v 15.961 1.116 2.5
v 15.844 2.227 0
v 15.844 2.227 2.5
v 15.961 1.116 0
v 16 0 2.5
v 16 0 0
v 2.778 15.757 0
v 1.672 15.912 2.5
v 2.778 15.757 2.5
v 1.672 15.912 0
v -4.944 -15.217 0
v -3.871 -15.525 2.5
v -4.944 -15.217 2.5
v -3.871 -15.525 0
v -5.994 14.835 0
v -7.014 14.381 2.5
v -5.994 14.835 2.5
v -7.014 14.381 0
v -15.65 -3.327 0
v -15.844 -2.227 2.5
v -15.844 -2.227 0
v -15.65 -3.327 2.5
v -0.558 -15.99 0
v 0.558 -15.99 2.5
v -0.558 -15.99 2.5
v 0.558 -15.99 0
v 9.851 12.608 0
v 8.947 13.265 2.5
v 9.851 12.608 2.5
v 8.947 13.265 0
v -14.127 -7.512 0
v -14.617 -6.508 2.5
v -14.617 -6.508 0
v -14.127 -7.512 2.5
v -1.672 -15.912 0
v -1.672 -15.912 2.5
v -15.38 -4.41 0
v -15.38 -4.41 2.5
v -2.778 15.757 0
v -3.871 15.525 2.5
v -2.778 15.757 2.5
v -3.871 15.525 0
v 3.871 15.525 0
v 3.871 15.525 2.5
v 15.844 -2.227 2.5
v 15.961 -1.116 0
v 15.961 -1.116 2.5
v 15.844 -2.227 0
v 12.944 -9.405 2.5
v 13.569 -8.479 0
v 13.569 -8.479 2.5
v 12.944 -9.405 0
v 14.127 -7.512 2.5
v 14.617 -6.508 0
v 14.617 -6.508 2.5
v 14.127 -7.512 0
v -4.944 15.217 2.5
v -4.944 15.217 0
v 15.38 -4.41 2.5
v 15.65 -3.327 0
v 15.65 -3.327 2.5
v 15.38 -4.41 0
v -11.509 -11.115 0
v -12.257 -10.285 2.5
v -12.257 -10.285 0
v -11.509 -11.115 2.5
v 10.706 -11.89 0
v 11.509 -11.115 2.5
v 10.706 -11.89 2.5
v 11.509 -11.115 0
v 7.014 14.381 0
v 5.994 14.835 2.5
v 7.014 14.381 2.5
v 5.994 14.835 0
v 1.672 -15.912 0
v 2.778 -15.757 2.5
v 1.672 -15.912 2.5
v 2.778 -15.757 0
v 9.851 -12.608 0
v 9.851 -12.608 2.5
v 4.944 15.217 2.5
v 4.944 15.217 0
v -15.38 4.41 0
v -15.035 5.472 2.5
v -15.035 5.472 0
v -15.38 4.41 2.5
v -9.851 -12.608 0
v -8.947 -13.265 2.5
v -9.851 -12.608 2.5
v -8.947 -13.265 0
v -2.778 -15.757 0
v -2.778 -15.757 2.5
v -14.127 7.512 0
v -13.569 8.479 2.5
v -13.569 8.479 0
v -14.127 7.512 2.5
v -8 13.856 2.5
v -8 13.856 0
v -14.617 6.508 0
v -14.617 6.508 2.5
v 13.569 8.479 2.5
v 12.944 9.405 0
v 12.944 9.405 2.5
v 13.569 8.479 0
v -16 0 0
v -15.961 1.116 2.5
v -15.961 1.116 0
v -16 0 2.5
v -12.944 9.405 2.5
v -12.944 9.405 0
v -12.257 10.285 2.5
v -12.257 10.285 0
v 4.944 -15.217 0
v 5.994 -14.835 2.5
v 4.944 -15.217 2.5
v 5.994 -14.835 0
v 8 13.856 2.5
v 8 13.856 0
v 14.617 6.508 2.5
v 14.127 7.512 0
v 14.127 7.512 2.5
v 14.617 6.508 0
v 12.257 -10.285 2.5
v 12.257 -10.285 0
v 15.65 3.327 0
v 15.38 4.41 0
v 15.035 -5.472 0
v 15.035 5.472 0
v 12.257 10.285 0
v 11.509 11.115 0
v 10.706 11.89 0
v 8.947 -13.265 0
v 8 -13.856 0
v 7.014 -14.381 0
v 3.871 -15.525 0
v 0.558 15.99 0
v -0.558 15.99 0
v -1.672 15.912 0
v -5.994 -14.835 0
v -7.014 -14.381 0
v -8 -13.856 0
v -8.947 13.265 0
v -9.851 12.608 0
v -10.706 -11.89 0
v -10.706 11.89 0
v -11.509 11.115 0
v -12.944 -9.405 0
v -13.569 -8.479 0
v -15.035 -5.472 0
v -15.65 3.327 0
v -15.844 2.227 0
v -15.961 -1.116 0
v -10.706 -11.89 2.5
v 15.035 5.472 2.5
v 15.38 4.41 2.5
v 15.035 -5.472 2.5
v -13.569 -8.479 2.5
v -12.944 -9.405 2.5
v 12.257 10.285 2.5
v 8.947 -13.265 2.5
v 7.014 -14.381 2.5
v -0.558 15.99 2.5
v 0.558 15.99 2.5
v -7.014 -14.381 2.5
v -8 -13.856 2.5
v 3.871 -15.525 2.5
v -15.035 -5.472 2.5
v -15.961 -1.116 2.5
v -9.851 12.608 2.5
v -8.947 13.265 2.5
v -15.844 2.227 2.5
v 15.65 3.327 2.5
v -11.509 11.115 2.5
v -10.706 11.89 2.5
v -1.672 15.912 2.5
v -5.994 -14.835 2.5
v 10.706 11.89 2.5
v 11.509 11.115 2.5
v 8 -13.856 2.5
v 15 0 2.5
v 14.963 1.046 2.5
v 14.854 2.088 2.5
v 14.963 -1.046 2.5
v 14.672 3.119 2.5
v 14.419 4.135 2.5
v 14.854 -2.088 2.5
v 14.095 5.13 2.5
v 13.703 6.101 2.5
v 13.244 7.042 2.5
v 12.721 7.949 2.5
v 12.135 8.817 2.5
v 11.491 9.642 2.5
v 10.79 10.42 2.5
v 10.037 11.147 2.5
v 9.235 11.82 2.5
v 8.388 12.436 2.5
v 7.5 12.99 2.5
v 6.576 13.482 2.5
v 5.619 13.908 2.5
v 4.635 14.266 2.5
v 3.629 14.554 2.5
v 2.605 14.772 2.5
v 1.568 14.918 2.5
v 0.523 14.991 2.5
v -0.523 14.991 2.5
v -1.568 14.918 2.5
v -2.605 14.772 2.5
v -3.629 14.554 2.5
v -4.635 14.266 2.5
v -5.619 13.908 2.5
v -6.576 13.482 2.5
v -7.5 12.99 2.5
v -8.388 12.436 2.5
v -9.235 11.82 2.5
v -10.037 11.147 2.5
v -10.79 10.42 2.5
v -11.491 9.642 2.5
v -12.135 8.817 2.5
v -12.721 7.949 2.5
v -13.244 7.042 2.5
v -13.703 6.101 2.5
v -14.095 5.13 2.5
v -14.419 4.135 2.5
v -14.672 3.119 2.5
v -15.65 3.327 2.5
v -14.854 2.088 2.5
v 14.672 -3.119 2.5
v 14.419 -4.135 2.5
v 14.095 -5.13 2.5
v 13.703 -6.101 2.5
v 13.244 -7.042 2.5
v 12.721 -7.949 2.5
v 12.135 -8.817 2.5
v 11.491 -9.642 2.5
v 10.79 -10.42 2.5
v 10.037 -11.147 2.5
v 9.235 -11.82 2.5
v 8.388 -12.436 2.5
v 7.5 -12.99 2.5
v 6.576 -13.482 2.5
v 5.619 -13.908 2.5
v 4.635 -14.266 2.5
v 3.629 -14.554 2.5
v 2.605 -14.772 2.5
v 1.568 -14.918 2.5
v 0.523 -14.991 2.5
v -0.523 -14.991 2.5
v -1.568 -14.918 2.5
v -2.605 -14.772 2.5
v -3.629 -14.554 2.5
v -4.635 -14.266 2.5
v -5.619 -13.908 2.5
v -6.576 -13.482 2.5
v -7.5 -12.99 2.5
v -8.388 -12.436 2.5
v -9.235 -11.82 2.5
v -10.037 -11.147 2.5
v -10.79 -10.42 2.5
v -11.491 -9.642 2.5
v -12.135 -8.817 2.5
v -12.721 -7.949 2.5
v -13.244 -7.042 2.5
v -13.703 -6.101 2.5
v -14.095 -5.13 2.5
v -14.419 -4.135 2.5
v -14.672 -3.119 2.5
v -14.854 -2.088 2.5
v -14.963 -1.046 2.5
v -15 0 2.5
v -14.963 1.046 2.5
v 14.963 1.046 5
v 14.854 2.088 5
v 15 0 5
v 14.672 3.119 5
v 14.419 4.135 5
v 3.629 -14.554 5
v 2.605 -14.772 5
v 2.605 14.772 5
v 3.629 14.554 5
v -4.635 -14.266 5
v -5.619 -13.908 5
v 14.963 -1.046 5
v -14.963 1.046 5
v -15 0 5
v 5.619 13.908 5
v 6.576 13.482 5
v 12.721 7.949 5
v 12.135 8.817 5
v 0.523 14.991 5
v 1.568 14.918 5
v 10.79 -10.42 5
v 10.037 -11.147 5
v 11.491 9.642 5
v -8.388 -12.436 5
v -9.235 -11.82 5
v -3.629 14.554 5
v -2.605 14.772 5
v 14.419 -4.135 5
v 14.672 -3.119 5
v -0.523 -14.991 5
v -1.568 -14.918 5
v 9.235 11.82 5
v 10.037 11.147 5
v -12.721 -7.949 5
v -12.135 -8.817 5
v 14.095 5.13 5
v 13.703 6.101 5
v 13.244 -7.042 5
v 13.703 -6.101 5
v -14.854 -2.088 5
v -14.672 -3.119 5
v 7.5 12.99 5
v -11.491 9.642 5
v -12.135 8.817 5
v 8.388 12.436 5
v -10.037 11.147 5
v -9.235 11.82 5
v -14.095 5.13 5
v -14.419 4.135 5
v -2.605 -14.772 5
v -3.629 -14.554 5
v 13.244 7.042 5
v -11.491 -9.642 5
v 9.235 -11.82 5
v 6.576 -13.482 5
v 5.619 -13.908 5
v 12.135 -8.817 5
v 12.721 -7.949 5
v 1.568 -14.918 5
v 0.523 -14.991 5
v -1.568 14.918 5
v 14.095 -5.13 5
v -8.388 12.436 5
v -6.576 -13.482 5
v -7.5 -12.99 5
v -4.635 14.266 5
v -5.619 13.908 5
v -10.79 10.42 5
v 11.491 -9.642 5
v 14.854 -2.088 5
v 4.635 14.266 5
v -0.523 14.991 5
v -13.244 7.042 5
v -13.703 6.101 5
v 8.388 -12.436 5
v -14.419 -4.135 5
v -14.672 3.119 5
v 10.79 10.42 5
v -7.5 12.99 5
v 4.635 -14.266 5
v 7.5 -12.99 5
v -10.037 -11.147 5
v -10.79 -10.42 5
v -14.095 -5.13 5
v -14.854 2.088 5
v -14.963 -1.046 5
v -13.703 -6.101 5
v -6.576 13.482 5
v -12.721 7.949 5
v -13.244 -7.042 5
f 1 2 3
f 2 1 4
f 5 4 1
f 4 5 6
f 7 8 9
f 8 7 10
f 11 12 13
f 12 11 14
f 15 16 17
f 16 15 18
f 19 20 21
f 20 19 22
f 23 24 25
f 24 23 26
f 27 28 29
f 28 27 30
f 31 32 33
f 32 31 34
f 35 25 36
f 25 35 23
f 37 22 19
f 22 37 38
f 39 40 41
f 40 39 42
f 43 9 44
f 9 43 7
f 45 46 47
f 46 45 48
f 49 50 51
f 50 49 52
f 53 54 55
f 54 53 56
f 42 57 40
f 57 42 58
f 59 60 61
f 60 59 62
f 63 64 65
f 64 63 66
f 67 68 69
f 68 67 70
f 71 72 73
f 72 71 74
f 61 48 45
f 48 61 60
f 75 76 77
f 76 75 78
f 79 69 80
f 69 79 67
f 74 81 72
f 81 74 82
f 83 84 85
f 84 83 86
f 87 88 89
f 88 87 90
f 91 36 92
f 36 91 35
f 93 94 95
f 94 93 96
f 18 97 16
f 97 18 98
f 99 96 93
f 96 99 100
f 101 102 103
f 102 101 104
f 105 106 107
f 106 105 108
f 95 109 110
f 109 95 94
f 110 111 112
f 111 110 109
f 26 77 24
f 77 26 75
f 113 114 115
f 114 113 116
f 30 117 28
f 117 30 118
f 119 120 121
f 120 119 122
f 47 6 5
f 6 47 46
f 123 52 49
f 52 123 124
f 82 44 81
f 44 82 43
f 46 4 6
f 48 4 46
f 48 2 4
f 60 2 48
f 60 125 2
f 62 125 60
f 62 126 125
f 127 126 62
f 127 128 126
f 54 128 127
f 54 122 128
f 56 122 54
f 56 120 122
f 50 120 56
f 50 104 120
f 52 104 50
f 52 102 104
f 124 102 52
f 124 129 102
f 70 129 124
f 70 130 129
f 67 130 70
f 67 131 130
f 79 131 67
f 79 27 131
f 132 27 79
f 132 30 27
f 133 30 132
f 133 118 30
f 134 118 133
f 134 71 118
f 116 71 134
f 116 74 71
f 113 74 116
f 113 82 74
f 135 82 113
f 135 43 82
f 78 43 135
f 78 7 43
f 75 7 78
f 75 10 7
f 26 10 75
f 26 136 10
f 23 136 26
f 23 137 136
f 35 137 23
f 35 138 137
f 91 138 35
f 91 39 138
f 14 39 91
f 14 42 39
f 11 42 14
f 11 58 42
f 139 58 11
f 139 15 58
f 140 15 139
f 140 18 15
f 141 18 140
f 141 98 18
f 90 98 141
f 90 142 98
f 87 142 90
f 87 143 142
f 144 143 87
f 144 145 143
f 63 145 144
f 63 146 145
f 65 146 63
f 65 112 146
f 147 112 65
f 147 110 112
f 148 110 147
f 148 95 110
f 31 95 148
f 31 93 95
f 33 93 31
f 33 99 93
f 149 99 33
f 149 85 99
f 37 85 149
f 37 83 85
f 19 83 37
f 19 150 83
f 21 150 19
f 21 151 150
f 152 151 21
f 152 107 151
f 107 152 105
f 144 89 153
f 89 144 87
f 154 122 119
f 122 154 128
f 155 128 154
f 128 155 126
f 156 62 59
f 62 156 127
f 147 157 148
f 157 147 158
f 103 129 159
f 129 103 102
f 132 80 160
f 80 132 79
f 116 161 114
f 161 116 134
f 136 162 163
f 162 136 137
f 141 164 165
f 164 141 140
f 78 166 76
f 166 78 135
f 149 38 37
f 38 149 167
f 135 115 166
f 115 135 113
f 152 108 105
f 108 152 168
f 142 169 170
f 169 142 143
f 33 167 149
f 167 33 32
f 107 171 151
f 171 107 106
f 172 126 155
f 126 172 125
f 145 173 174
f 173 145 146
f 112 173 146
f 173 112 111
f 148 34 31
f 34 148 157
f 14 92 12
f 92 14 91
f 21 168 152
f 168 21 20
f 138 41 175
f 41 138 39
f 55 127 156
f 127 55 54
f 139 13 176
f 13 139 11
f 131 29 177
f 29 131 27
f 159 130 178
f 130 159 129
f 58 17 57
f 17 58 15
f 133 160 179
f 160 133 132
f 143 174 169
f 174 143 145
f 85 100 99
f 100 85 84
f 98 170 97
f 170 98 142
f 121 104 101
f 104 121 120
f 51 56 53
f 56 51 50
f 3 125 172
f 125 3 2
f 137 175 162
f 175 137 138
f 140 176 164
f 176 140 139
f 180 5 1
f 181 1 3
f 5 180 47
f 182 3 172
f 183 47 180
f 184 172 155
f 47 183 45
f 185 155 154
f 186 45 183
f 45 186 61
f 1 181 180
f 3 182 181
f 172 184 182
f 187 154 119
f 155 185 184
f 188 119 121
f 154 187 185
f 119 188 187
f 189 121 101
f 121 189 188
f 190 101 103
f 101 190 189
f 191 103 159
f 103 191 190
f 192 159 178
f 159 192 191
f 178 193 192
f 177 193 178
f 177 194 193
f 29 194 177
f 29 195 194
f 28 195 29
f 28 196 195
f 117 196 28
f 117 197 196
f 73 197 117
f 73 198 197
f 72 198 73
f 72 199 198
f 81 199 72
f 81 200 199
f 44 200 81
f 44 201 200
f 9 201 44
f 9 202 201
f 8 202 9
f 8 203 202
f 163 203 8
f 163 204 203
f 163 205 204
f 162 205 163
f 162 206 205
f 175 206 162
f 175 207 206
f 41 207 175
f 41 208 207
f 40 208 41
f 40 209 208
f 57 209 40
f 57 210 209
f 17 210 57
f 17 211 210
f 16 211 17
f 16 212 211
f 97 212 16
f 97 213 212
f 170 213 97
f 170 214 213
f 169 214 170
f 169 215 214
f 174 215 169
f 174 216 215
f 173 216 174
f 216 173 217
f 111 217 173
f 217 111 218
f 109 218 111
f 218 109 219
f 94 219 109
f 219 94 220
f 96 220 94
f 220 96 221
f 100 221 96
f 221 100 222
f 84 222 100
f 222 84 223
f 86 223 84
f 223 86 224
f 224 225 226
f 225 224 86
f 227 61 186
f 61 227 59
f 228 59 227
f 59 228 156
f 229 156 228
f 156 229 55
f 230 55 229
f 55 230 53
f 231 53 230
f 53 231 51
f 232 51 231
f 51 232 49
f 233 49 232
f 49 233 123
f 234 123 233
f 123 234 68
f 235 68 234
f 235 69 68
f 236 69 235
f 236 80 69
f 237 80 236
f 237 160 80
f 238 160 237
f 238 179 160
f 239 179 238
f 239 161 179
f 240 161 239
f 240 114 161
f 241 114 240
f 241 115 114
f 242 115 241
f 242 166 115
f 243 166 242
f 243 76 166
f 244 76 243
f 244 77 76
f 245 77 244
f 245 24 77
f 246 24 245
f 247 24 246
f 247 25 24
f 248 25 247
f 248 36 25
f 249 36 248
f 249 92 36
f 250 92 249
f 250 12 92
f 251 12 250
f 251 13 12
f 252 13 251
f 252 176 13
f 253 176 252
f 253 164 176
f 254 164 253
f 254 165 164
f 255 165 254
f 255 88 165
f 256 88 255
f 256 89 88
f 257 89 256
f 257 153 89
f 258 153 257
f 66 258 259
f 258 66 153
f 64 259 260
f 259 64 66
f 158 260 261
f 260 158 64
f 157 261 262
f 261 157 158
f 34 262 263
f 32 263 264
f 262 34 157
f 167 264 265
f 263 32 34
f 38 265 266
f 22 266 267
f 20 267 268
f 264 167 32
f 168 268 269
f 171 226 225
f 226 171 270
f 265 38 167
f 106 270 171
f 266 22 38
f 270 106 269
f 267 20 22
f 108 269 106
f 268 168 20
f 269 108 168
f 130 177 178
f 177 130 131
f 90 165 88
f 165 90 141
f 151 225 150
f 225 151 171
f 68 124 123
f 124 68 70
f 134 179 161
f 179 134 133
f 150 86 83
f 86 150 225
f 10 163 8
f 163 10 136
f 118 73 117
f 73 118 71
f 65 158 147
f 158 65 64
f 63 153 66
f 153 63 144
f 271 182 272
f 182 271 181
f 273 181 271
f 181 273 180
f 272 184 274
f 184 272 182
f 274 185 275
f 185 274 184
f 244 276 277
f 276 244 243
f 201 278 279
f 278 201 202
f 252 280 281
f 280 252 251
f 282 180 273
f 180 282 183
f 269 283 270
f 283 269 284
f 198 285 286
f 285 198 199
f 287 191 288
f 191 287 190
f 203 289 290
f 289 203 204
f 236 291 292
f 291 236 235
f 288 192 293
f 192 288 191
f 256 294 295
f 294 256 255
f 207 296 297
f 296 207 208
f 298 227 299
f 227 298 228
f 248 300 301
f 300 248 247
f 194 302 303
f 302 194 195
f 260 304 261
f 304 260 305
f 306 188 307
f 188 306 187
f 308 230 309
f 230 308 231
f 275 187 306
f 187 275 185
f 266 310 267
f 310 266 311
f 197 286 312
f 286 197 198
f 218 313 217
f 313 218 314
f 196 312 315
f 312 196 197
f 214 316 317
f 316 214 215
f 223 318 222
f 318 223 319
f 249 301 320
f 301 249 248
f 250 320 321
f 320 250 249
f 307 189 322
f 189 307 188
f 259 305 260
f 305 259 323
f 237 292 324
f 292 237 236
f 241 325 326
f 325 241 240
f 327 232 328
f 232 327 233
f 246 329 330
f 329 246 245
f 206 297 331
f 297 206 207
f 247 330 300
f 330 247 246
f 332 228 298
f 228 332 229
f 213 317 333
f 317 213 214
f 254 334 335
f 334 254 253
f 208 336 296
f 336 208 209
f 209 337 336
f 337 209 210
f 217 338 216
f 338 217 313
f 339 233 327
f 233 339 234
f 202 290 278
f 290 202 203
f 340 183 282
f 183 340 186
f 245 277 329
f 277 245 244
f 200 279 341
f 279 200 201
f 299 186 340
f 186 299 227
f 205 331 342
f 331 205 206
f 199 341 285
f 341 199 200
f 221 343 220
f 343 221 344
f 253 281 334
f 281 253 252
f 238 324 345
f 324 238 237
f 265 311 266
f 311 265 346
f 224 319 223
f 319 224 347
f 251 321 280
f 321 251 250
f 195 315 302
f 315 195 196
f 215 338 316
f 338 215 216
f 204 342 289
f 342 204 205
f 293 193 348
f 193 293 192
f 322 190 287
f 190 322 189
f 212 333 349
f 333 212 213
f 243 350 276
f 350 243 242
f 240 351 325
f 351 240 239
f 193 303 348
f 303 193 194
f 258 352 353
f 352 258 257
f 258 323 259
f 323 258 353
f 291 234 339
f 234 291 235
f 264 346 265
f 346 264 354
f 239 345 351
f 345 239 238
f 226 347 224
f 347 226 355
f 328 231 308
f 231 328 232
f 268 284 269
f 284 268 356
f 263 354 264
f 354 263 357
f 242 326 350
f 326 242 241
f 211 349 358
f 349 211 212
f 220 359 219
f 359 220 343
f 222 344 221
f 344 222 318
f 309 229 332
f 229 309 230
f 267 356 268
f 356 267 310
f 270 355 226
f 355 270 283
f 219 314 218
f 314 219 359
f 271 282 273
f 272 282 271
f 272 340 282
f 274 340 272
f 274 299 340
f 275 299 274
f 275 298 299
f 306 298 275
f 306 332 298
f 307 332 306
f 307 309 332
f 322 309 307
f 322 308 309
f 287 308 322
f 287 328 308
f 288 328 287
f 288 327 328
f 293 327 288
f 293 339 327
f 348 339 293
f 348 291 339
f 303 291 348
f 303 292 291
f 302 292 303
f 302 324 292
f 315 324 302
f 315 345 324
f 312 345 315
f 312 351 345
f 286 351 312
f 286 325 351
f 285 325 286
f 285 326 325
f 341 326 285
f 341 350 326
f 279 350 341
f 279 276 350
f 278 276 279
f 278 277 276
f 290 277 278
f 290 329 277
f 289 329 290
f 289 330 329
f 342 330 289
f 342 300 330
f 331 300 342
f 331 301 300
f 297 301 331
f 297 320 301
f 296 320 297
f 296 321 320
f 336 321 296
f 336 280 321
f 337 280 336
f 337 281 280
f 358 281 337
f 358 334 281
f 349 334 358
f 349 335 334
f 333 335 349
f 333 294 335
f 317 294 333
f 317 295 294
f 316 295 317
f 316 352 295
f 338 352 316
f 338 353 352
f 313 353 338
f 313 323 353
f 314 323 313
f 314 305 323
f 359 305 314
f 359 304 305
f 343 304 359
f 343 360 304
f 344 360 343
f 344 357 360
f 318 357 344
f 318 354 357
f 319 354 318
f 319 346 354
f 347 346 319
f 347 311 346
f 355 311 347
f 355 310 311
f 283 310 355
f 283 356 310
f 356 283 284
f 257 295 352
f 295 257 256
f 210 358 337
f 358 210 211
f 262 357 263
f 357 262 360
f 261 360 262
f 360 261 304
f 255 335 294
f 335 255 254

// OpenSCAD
$fa=4; // default minimum facet angle is now 4
$fs=0.05; // default minimum facet size is now 0.05 mm

cylinder(r=16, h=2.5);
cylinder(r=15, h=5);
